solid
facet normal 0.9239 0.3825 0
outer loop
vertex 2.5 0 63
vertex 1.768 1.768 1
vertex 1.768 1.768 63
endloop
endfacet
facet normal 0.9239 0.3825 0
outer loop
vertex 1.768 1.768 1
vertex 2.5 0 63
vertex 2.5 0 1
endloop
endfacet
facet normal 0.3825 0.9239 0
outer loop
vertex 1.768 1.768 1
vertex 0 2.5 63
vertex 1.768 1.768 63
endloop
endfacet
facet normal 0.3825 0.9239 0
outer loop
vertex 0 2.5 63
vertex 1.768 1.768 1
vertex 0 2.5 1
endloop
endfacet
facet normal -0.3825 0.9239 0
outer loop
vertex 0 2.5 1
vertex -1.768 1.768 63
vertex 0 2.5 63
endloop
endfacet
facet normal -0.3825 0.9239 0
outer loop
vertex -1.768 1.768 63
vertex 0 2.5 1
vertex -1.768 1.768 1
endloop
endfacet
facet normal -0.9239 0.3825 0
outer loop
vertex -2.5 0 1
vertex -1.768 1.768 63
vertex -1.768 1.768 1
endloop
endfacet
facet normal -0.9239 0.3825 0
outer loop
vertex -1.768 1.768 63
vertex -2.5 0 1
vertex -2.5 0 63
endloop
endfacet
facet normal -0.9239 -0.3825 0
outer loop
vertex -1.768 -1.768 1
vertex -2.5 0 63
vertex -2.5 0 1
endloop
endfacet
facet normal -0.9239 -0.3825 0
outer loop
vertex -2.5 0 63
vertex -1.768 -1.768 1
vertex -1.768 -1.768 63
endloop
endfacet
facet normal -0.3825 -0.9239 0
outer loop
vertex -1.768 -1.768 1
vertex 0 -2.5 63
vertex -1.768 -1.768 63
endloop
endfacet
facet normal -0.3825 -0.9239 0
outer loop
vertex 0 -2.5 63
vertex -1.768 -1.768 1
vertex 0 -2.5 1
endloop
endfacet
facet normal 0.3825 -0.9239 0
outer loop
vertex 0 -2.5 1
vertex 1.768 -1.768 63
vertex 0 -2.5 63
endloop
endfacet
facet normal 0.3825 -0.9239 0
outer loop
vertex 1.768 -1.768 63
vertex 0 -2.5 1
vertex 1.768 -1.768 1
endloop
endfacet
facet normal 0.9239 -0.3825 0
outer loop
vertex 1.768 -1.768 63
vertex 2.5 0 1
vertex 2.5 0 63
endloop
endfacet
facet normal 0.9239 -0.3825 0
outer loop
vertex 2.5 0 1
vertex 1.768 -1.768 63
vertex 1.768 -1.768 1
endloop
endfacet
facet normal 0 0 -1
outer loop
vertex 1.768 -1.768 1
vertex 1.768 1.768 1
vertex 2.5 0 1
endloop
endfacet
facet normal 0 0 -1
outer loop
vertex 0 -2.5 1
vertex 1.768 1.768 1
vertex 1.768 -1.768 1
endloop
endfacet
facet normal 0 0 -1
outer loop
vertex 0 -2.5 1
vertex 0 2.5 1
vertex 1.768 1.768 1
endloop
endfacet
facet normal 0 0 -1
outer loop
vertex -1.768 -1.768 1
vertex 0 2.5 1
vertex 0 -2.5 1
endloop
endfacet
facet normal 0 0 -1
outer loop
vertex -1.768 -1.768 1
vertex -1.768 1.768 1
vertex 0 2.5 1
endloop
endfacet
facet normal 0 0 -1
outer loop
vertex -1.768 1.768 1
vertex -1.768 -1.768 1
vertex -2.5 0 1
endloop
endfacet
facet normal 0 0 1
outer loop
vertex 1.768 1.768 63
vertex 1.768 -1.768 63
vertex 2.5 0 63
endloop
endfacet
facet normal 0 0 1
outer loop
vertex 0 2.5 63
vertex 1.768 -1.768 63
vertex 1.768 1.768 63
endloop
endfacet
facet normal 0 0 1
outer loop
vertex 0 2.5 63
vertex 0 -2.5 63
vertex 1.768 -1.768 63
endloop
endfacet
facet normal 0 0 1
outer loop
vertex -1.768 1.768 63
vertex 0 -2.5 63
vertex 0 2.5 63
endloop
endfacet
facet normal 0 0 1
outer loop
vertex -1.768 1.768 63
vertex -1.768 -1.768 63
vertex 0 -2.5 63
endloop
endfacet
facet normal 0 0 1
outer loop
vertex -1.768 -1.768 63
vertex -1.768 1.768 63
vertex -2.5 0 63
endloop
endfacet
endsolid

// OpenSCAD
/*
translate([80,33+30+50,1])#union(){
import("ArduinoMegaBoard.stl");
translate([44.3,1.9,12])import("Ramps14_3D.stl");
}
*/
/*
union(){
difference(){
cube([150,150,1]);
translate([44.5,137.3,-5])cylinder(r=2,h=50,$fn=16);
translate([44.5+80,137.3-48.5,-5])cylinder(r=2,h=50,$fn=16);
}
translate([100,55,0])cube([20,20,26]); //apoyo del stppexp
hull(){
translate([0,149,30])cube([150,1,1]);
translate([0,150-7,0])cube([150,7,1]);
}
}
//translate([89,53,26])cube([42,26,2]);
*/




//translate([105,60,28])cube([10,10,35]);

//tapa
/*
union(){
difference(){
translate([0,0,63])cube([150,150,1]);

translate([110,30,10])cylinder(r=27.5/2,h=80);
translate([110-27.5-26,30,10])cylinder(r=27.5/2,h=80);
}
}
*/

union(){
translate([0,0,1])cylinder(r=5/2,h=62);
}
